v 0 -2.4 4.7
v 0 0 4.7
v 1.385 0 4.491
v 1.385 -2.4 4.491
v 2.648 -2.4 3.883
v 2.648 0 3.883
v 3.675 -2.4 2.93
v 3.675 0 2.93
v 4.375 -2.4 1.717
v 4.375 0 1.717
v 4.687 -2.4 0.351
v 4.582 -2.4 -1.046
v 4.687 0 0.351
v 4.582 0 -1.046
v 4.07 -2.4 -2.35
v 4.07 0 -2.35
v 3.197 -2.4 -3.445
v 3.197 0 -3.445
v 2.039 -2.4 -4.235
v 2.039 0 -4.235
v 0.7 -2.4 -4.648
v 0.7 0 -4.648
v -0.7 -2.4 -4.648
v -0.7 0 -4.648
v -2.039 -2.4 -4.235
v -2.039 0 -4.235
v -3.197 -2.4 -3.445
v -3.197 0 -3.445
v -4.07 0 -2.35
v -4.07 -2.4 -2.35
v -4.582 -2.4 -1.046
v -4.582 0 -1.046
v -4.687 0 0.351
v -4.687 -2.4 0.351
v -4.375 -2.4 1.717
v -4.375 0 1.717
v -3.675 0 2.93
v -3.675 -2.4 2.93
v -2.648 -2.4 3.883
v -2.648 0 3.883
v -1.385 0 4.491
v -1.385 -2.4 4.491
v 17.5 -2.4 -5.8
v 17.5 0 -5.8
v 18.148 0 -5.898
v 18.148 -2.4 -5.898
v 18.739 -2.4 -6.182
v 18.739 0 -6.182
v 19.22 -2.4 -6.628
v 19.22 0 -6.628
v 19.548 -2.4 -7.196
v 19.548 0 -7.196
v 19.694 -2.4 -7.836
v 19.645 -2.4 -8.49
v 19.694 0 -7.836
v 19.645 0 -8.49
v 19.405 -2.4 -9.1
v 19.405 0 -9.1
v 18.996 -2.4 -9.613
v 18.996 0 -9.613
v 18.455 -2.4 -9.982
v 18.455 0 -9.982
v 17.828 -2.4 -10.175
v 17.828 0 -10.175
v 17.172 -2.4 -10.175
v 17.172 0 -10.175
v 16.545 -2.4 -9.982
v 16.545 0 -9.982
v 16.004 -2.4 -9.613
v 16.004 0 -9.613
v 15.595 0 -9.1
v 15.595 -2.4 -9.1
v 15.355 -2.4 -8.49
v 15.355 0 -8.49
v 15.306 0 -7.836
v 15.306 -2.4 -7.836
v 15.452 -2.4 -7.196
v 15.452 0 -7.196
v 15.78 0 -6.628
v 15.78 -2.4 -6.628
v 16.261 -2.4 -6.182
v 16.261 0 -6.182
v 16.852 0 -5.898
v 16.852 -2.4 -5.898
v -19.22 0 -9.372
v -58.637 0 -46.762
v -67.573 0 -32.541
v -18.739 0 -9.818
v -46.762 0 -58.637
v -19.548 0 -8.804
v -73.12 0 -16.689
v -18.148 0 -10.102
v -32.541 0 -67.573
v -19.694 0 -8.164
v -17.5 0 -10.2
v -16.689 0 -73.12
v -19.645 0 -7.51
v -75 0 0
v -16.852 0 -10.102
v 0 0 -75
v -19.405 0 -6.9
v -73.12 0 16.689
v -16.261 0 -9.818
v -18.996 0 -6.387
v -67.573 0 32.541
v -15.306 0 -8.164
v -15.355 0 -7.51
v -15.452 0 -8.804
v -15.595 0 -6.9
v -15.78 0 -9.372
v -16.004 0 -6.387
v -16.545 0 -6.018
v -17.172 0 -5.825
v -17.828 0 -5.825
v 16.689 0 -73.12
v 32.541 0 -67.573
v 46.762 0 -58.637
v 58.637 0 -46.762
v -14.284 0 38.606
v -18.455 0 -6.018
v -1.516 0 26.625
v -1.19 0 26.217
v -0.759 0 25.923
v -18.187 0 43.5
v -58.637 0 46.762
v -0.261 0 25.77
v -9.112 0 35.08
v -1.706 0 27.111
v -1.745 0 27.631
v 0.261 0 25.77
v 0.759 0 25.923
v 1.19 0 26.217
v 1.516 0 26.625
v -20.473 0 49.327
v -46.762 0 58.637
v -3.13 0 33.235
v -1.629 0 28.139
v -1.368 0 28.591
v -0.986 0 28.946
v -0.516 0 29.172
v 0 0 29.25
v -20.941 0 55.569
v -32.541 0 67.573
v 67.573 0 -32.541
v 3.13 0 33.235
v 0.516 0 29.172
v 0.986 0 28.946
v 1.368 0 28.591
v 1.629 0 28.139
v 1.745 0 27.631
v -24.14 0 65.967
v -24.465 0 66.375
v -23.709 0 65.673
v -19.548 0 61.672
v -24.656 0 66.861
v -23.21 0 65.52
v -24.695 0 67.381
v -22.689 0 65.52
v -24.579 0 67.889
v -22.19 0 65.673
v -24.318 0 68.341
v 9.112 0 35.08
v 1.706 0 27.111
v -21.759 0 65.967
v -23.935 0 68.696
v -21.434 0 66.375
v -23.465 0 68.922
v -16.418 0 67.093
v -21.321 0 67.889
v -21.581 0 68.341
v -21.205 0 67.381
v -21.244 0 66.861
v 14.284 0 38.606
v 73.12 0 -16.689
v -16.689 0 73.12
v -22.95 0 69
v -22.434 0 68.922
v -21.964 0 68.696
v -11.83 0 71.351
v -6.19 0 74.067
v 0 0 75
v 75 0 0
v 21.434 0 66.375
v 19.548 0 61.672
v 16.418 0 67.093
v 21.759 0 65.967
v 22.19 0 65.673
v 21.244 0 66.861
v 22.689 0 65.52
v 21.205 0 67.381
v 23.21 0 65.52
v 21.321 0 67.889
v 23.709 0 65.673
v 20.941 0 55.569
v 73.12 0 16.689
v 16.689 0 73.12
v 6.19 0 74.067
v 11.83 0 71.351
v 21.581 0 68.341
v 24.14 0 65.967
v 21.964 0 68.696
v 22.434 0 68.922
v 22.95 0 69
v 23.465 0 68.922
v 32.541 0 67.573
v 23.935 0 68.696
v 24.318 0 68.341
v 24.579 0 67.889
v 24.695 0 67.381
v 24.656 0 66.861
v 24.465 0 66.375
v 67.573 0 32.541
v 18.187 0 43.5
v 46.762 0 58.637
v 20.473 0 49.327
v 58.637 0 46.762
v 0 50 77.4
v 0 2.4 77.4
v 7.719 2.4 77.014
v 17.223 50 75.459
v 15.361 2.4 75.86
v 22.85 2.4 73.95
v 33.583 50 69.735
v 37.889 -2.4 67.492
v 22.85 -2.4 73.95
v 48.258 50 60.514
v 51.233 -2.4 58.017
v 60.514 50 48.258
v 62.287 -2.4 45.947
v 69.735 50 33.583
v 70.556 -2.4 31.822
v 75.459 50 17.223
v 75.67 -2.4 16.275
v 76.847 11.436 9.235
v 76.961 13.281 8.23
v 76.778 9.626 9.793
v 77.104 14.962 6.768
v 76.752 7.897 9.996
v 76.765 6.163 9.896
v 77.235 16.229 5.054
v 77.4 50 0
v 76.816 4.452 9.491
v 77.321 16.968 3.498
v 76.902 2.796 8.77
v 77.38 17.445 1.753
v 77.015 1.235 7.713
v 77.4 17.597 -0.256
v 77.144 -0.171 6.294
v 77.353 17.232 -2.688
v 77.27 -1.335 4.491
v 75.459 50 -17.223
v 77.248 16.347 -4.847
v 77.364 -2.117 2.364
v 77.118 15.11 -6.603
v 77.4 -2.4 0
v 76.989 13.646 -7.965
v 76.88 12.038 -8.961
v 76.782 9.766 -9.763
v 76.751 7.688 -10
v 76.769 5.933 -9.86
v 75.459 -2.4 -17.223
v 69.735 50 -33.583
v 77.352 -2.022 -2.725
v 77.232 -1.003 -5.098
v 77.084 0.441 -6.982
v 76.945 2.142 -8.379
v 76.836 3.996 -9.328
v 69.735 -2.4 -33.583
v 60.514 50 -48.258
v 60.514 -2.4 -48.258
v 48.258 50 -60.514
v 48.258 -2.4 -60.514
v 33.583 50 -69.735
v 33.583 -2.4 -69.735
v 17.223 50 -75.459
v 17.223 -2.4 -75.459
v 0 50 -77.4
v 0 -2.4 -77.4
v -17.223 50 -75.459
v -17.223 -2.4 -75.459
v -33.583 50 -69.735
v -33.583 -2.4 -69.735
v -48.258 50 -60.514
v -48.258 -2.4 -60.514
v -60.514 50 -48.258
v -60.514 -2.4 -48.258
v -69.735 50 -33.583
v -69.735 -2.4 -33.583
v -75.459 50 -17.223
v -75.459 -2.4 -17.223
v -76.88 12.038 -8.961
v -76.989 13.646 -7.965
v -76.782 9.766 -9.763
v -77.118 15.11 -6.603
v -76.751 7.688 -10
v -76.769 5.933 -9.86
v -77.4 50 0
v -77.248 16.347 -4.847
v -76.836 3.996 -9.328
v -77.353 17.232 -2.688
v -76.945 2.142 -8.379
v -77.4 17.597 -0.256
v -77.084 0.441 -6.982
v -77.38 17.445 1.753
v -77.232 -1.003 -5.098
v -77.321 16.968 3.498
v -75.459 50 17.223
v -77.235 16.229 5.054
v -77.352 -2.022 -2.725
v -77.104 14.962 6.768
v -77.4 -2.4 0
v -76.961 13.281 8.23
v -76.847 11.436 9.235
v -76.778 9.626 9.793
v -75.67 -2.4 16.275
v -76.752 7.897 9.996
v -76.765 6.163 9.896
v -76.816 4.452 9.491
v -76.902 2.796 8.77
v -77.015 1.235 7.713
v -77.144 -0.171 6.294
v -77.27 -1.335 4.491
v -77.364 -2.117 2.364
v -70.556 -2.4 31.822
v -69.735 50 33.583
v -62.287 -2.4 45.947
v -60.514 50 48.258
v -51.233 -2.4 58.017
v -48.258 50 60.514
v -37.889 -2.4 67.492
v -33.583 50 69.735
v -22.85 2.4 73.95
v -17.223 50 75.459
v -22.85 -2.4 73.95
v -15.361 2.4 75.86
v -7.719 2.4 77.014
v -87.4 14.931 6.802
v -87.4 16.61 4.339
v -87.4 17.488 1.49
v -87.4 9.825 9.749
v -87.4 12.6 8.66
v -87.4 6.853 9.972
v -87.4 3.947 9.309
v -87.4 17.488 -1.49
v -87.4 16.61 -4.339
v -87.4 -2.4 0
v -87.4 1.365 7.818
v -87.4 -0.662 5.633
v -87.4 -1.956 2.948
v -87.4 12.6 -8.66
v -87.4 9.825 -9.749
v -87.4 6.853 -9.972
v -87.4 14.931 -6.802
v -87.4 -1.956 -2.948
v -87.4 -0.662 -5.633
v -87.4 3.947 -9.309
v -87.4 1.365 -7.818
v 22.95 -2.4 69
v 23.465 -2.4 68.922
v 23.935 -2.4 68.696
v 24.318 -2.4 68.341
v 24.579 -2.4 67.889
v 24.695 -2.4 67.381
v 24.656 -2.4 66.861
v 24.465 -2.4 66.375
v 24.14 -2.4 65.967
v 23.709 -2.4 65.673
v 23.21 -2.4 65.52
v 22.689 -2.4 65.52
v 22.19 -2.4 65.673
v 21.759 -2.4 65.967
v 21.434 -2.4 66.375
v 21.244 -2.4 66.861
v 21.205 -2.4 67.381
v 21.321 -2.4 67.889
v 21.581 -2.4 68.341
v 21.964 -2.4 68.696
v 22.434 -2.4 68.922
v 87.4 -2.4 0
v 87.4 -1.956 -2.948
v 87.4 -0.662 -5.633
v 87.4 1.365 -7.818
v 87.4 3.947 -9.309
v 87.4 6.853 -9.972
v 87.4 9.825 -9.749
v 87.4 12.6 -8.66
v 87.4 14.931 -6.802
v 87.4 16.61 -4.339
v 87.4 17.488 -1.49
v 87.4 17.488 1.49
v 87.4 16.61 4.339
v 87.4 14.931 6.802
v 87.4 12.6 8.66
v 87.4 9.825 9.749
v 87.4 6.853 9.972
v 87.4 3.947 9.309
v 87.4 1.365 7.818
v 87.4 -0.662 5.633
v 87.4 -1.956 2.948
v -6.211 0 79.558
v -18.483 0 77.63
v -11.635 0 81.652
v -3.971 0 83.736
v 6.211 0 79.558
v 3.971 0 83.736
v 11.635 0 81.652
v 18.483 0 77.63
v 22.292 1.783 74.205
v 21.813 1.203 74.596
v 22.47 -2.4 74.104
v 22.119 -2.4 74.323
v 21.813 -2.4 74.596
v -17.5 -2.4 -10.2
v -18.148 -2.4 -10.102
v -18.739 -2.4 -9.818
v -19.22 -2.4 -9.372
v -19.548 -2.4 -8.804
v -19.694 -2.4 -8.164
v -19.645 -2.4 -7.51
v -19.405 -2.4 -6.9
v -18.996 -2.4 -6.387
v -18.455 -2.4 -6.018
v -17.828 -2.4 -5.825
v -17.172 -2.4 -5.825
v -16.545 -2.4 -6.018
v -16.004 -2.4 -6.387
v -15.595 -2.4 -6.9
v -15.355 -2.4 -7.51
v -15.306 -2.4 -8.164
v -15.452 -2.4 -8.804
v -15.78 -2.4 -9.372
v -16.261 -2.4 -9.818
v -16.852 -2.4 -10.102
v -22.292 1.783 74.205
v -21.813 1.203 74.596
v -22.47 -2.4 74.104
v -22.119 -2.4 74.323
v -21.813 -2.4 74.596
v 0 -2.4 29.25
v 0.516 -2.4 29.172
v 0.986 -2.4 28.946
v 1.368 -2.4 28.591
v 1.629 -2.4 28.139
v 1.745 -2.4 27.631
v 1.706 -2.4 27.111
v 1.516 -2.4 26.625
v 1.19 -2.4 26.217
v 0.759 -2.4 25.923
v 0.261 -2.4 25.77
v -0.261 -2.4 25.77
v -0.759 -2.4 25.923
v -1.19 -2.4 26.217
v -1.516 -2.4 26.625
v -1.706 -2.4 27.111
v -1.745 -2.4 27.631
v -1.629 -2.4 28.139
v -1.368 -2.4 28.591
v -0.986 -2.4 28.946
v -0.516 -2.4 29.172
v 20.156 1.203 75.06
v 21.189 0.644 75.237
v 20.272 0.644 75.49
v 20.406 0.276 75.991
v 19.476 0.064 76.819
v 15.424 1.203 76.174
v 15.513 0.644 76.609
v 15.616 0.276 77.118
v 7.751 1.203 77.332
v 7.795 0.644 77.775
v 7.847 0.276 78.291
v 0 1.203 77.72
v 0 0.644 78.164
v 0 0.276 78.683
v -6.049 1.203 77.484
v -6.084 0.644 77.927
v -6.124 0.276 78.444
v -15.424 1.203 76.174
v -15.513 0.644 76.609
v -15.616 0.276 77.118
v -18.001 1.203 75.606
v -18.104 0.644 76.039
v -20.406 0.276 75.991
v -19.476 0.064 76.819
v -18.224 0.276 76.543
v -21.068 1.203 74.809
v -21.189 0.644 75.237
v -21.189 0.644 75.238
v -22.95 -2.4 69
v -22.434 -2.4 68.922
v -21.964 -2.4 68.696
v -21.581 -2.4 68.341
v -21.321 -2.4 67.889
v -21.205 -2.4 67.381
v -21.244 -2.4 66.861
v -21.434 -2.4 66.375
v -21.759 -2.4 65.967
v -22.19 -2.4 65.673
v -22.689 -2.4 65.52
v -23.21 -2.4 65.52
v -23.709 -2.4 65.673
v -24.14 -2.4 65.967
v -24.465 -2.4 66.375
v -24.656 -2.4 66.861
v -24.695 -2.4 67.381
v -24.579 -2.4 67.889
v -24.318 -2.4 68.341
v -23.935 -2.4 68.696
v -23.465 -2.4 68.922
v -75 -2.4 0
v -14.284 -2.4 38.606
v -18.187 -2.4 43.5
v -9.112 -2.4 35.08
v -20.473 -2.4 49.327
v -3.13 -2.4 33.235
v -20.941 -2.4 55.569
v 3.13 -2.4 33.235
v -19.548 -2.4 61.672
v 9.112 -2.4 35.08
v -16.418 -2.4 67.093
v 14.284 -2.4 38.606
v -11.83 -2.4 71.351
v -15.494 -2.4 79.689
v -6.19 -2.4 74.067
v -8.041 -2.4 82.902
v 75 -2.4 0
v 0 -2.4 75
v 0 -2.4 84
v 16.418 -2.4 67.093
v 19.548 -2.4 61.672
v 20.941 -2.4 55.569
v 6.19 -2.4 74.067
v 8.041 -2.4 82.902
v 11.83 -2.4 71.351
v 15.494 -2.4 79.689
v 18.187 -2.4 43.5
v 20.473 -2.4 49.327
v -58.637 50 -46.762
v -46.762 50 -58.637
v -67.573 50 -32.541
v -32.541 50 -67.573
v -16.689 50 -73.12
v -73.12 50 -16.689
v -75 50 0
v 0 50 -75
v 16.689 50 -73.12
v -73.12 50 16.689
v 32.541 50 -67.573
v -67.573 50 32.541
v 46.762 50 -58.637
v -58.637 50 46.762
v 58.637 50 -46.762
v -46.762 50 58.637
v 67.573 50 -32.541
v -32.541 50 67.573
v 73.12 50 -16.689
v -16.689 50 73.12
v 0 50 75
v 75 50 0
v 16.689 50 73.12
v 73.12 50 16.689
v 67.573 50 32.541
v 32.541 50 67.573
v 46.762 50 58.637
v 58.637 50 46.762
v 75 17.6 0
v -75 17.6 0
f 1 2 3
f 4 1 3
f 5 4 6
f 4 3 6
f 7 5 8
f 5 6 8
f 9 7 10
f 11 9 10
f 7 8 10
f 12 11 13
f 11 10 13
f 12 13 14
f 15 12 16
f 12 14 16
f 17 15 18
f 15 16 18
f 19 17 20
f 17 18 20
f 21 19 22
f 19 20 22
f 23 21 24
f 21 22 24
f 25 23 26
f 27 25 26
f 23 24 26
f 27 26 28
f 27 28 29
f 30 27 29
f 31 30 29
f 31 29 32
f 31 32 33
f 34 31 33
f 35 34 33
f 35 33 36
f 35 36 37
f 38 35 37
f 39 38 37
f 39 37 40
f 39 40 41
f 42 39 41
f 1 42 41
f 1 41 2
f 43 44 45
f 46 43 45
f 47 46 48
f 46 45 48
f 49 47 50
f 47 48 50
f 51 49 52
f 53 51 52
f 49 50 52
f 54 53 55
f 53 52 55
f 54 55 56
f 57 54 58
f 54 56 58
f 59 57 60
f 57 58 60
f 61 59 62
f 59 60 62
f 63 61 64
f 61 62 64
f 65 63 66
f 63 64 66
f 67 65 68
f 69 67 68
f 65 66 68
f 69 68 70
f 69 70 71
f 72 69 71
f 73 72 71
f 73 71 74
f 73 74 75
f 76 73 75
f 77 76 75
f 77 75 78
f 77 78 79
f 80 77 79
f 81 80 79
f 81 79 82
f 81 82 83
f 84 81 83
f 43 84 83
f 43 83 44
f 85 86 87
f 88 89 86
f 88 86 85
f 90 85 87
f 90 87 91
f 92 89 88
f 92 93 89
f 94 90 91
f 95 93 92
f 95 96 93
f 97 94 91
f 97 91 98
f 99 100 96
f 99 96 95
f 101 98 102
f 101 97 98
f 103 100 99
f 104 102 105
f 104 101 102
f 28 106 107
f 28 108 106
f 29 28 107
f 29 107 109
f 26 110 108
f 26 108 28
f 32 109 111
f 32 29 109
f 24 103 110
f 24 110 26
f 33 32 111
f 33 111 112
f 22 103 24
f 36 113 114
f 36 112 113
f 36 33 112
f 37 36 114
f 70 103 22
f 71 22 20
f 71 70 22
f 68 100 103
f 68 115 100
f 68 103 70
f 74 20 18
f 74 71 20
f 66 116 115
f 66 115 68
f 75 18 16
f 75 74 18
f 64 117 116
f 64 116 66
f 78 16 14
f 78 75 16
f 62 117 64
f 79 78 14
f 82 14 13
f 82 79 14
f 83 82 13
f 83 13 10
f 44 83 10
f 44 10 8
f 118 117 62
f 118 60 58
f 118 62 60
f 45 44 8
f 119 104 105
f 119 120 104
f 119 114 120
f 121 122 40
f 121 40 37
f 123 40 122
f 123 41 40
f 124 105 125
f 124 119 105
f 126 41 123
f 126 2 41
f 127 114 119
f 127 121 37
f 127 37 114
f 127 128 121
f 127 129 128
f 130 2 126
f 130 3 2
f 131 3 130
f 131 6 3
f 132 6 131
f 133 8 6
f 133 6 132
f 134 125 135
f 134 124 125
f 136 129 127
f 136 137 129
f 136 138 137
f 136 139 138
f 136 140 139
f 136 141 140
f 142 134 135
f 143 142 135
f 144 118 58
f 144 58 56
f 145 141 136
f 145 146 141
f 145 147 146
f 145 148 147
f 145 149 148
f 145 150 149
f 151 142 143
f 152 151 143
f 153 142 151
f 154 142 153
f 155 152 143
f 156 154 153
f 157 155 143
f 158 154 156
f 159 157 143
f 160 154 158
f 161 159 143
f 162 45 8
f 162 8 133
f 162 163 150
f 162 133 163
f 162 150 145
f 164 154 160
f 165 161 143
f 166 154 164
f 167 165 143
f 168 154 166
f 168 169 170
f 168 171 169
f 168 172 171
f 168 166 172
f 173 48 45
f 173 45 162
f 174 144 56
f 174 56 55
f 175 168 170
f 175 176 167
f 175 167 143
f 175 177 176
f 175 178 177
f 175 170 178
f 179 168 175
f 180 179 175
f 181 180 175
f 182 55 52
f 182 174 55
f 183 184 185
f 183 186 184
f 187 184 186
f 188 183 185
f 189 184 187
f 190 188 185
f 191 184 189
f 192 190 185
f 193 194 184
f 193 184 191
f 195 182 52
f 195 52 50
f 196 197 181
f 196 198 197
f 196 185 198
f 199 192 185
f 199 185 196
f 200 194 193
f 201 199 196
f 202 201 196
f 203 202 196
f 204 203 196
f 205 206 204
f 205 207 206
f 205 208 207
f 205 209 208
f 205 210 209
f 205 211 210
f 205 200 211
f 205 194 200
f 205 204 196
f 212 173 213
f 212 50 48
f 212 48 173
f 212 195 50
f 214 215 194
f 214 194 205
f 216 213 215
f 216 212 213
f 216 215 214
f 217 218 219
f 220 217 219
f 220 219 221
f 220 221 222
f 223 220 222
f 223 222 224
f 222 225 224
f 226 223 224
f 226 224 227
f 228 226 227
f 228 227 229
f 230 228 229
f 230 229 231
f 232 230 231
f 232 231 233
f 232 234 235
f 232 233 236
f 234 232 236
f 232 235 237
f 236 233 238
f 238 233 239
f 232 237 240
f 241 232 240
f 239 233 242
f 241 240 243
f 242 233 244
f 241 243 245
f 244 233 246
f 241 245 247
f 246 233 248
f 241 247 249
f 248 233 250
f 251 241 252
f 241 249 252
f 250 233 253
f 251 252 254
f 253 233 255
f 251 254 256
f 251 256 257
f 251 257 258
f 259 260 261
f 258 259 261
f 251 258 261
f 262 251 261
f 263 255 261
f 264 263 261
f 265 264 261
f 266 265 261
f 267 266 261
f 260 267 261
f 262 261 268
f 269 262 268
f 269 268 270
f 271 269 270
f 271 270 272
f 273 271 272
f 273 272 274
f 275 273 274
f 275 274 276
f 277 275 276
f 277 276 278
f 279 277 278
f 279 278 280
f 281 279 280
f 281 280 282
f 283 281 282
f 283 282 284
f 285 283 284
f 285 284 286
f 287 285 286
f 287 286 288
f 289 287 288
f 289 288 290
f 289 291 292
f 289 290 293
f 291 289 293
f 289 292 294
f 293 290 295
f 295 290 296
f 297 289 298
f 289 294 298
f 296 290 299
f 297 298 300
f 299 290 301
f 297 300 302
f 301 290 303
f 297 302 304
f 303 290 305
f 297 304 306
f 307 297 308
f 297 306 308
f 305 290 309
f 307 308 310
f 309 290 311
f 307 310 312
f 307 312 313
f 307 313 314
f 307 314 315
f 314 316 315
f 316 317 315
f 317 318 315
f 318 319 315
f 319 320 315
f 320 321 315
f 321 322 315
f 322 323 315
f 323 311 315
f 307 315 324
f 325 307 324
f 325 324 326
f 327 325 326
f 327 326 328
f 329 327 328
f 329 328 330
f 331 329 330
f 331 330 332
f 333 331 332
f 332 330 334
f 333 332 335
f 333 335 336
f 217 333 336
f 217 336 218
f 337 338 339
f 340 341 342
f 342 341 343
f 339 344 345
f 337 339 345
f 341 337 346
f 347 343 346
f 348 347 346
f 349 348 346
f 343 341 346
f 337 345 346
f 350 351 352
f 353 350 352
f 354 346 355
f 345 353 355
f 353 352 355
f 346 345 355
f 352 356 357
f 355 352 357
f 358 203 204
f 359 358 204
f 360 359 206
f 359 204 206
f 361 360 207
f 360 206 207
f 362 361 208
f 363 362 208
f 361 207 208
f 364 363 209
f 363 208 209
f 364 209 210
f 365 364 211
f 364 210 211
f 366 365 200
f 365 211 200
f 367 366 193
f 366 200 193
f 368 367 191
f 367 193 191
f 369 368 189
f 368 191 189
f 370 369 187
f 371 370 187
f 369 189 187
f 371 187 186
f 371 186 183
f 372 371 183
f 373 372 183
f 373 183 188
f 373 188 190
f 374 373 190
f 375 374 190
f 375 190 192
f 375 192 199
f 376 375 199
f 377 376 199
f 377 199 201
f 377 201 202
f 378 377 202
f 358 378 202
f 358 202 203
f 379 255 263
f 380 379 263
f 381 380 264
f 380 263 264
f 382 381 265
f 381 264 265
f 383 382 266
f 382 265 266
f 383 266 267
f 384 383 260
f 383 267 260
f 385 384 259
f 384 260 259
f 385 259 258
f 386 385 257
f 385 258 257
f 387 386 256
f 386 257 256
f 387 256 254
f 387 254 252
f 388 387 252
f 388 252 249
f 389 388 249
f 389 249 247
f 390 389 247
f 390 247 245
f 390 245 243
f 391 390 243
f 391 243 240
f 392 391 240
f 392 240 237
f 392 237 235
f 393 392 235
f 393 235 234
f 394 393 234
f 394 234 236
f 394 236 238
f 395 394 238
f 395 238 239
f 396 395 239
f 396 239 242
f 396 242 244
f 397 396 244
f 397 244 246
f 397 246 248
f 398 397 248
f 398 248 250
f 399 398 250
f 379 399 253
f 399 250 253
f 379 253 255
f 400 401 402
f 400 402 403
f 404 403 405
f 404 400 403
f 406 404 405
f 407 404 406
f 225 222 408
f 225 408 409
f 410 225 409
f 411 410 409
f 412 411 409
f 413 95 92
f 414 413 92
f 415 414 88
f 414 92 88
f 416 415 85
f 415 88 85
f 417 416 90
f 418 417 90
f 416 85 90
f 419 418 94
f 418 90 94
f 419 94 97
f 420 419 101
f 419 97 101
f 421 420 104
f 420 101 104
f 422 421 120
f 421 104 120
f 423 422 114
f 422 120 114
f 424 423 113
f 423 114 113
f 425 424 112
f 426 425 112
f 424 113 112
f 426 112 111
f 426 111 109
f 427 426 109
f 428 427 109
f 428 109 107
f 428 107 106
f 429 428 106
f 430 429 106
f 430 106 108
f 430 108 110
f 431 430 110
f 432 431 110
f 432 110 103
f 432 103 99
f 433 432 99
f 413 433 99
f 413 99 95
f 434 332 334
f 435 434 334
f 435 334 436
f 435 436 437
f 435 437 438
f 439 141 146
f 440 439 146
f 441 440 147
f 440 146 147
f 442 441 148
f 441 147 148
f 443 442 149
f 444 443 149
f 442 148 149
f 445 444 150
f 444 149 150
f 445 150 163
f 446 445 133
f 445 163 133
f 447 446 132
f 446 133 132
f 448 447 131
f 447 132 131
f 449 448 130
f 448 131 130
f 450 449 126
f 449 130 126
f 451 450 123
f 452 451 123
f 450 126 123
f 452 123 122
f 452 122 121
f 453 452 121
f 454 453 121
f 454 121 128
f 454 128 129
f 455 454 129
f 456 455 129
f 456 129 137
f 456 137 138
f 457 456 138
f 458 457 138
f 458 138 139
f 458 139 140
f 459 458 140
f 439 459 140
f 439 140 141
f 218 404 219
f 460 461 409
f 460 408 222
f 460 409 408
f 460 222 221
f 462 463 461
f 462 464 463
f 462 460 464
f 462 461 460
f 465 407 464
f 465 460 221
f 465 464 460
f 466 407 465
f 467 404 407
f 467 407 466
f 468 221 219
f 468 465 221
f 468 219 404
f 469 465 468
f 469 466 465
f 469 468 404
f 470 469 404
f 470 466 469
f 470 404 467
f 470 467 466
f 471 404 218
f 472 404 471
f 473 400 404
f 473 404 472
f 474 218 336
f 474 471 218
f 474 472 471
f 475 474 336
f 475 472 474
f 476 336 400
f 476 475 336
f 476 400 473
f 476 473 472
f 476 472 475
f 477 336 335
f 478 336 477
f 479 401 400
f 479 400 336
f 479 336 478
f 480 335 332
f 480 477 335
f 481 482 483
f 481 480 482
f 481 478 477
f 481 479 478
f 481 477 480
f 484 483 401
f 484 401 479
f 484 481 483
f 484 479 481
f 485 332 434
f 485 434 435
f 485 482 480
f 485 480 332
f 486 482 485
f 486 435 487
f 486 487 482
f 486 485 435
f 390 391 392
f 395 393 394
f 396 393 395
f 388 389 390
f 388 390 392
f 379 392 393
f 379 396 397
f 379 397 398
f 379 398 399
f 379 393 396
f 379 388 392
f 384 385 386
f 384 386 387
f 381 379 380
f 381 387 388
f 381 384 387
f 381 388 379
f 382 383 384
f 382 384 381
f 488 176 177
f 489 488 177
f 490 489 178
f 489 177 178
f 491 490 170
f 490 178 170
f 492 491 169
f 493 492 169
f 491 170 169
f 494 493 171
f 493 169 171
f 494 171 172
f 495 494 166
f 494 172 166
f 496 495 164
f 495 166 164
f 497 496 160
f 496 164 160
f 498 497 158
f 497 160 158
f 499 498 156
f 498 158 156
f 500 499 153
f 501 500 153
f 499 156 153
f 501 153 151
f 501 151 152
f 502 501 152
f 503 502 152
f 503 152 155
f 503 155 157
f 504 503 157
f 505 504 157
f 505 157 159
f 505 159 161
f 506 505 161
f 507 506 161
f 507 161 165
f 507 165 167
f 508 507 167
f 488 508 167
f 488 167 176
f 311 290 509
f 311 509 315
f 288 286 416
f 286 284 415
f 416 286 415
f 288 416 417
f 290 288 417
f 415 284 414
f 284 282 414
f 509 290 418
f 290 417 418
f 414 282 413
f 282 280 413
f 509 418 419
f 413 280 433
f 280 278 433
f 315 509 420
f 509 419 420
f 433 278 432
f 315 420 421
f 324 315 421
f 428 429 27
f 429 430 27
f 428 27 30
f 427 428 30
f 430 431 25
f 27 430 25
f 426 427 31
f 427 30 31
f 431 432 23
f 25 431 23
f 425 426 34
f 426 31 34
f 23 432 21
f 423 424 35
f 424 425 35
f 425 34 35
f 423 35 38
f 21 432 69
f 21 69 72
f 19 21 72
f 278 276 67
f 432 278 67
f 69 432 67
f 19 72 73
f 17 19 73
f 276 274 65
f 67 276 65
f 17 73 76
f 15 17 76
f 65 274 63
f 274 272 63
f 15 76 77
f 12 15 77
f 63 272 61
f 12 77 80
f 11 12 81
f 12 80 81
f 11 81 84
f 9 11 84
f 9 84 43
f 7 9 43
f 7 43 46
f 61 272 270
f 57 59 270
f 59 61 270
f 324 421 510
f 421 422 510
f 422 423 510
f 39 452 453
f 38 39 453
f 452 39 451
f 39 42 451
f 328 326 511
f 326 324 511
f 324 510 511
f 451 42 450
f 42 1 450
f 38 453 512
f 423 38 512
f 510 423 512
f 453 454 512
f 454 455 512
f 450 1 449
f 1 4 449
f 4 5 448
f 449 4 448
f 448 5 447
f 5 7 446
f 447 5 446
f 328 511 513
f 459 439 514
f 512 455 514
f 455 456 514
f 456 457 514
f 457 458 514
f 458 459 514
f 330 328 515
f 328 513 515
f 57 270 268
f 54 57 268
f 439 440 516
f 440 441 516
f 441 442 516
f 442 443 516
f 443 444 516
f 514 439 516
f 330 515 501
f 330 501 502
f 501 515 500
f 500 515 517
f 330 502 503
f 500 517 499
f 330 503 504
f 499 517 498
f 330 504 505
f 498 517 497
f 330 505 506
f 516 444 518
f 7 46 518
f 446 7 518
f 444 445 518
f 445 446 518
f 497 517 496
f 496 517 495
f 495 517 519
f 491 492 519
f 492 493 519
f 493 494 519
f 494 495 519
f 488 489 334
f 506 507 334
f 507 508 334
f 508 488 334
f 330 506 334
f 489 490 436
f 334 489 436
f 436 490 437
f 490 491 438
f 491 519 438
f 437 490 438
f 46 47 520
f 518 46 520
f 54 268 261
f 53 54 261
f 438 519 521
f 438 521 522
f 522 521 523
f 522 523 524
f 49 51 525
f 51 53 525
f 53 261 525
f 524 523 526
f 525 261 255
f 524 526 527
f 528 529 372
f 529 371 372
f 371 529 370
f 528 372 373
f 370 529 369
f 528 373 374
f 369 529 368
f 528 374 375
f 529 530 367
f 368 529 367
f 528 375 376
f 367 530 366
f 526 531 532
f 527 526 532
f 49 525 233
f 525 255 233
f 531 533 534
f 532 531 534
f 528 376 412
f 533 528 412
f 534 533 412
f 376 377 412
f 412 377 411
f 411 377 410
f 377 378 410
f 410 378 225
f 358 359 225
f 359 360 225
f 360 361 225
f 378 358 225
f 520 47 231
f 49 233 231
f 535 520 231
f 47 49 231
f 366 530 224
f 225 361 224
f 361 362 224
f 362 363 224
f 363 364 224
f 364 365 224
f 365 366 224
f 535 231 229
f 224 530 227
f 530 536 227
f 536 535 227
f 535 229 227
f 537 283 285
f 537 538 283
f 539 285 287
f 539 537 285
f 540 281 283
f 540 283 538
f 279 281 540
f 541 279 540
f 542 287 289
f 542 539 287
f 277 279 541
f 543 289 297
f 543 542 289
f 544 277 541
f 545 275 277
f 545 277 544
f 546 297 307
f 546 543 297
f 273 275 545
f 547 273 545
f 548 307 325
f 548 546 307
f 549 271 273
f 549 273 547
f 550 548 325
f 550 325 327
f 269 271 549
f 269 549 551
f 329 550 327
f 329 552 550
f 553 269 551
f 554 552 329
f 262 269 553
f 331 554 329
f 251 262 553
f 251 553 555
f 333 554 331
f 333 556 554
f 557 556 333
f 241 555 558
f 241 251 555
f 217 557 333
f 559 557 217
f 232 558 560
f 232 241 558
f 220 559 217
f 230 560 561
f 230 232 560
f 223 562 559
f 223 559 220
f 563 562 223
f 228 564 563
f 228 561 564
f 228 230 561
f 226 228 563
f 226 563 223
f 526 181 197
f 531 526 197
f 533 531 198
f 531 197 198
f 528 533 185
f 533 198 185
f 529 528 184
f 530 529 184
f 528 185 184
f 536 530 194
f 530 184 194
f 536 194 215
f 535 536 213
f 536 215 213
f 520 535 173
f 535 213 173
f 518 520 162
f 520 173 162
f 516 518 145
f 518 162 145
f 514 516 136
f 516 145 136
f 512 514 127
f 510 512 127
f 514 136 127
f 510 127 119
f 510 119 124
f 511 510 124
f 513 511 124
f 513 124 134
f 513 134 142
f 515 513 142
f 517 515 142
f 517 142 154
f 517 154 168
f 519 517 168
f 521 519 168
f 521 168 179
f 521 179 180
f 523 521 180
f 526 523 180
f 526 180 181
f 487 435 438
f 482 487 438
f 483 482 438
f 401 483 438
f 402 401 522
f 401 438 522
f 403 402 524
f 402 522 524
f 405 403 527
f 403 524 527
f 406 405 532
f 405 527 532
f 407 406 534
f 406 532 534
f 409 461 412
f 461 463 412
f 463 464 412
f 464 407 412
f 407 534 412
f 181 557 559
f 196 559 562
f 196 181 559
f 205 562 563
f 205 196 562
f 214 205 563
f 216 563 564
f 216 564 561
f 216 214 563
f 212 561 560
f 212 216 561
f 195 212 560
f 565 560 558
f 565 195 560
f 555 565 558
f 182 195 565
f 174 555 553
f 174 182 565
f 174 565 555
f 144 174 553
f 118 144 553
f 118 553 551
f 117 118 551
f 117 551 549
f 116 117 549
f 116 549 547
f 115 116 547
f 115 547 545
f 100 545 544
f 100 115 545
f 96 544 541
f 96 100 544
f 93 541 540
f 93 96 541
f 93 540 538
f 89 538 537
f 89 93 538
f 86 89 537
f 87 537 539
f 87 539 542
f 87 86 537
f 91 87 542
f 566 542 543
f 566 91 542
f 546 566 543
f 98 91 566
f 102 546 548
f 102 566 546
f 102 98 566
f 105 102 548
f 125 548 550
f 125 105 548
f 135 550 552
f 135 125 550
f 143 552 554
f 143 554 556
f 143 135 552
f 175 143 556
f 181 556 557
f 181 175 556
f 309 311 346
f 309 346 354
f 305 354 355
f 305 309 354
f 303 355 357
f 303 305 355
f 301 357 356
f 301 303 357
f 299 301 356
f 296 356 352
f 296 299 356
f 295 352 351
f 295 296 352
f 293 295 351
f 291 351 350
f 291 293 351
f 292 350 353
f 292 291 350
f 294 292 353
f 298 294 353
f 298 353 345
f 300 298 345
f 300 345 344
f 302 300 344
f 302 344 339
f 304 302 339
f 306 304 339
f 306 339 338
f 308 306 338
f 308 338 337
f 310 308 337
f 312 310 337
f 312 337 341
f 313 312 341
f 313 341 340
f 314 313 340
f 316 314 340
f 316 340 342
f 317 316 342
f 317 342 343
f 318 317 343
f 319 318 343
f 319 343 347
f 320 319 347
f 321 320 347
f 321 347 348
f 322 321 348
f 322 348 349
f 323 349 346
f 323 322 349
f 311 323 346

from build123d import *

# Parameters (mm, degrees)
SKETCH1_R           = 75
BOSS_EXTRUDE1_DEPTH = 50
SHELL1_T            = 2.4
SKETCH2_R           = 21
SKETCH2_R_2         = 1.75
CUT_EXTRUDE1_DEPTH  = 121.3391873
BOSS_EXTRUDE3_START = -2.4
BOSS_EXTRUDE3_DEPTH = 2.4
FILLET1_R           = 2.4
SKETCH5_R           = 10
BOSS_EXTRUDE5_DEPTH = 12.4
SKETCH6_R           = 4.7
SKETCH6_R_2         = 2.2
CUT_EXTRUDE2_DEPTH  = 132.12879182


with BuildPart() as part:
    # Sketch1 → Boss-Extrude1 (new body)
    with BuildSketch(Plane(origin=(0, 0, 0), x_dir=(1, 0, 0), z_dir=(0, 1, 0))):
        with Locations(Location((0, 0, 0), (0, 0, 270))):
            Circle(SKETCH1_R)
    extrude(amount=BOSS_EXTRUDE1_DEPTH)

    # Shell1
    shell1_openings = [part.faces().sort_by_distance(p)[0] for p in [
        (0, 50, 0),
    ]]
    offset(amount=SHELL1_T, openings=shell1_openings, kind=Kind.INTERSECTION)

    # Sketch2 → Cut-Extrude1 (cut, through all)
    with BuildSketch(Plane(origin=(0, 0, 0), x_dir=(1, 0, 0), z_dir=(0, 1, 0))):
        with Locations(Location((0, -54, 0), (0, 0, 270))):
            Circle(SKETCH2_R)
        with Locations(Location((0, -27.5, 0), (0, 0, 270))):
            Circle(SKETCH2_R_2)
        with Locations(Location((22.9496732, -67.25, 0), (0, 0, 270))):
            Circle(SKETCH2_R_2)
        with Locations(Location((-22.9496732, -67.25, 0), (0, 0, 270))):
            Circle(SKETCH2_R_2)
    extrude(amount=-CUT_EXTRUDE1_DEPTH, mode=Mode.SUBTRACT)

    # Sketch3 → Boss-Extrude3 (add)
    with BuildSketch(Plane(origin=(0, 0, 0), x_dir=(1, 0, 0), z_dir=(0, 1, 0)).offset(BOSS_EXTRUDE3_START)):
        with BuildLine():
            ThreePointArc((-24.888501361, -70.75), (0, -84), (24.888501361, -70.75))
            ThreePointArc((24.888501361, -70.75), (0, -75), (-24.888501361, -70.75))
        make_face()
    extrude(amount=BOSS_EXTRUDE3_DEPTH)

    # Fillet1
    fillet1_edges = [part.edges().sort_by_distance(p)[0] for p in [
        (-22.237685481, -1.2, 74.136666667),
        (22.237685481, -1.2, 74.136666667),
        (11.237926855, 0, 76.579821102),
    ]]
    fillet(fillet1_edges, radius=FILLET1_R)

    # Sketch5 → Boss-Extrude5 (add)
    with BuildSketch(Plane(origin=(75, 0, 0), x_dir=(0, 0, -1), z_dir=(1, 0, 0))):
        with Locations(Location((0, 7.6, 0), (0, 0, 270))):
            Circle(SKETCH5_R)
    boss_extrude5 = extrude(amount=BOSS_EXTRUDE5_DEPTH)

    # Mirror1: Boss-Extrude5 across plane
    add(boss_extrude5.mirror(Plane(origin=(0, 0, 0), x_dir=(0, 0, 1), z_dir=(1, 0, 0))))

    # Sketch6 → Cut-Extrude2 (cut, through all)
    with BuildSketch(Plane(origin=(0, 0, 0), x_dir=(1, 0, 0), z_dir=(0, 1, 0))):
        with Locations(Location((0, 0, 0), (0, 0, 270))):
            Circle(SKETCH6_R)
        with Locations(Location((17.5, 8, 0), (0, 0, 270))):
            Circle(SKETCH6_R_2)
        with Locations(Location((-17.5, 8, 0), (0, 0, 90))):
            Circle(SKETCH6_R_2)
    extrude(amount=-CUT_EXTRUDE2_DEPTH, mode=Mode.SUBTRACT)


solid = part.part
